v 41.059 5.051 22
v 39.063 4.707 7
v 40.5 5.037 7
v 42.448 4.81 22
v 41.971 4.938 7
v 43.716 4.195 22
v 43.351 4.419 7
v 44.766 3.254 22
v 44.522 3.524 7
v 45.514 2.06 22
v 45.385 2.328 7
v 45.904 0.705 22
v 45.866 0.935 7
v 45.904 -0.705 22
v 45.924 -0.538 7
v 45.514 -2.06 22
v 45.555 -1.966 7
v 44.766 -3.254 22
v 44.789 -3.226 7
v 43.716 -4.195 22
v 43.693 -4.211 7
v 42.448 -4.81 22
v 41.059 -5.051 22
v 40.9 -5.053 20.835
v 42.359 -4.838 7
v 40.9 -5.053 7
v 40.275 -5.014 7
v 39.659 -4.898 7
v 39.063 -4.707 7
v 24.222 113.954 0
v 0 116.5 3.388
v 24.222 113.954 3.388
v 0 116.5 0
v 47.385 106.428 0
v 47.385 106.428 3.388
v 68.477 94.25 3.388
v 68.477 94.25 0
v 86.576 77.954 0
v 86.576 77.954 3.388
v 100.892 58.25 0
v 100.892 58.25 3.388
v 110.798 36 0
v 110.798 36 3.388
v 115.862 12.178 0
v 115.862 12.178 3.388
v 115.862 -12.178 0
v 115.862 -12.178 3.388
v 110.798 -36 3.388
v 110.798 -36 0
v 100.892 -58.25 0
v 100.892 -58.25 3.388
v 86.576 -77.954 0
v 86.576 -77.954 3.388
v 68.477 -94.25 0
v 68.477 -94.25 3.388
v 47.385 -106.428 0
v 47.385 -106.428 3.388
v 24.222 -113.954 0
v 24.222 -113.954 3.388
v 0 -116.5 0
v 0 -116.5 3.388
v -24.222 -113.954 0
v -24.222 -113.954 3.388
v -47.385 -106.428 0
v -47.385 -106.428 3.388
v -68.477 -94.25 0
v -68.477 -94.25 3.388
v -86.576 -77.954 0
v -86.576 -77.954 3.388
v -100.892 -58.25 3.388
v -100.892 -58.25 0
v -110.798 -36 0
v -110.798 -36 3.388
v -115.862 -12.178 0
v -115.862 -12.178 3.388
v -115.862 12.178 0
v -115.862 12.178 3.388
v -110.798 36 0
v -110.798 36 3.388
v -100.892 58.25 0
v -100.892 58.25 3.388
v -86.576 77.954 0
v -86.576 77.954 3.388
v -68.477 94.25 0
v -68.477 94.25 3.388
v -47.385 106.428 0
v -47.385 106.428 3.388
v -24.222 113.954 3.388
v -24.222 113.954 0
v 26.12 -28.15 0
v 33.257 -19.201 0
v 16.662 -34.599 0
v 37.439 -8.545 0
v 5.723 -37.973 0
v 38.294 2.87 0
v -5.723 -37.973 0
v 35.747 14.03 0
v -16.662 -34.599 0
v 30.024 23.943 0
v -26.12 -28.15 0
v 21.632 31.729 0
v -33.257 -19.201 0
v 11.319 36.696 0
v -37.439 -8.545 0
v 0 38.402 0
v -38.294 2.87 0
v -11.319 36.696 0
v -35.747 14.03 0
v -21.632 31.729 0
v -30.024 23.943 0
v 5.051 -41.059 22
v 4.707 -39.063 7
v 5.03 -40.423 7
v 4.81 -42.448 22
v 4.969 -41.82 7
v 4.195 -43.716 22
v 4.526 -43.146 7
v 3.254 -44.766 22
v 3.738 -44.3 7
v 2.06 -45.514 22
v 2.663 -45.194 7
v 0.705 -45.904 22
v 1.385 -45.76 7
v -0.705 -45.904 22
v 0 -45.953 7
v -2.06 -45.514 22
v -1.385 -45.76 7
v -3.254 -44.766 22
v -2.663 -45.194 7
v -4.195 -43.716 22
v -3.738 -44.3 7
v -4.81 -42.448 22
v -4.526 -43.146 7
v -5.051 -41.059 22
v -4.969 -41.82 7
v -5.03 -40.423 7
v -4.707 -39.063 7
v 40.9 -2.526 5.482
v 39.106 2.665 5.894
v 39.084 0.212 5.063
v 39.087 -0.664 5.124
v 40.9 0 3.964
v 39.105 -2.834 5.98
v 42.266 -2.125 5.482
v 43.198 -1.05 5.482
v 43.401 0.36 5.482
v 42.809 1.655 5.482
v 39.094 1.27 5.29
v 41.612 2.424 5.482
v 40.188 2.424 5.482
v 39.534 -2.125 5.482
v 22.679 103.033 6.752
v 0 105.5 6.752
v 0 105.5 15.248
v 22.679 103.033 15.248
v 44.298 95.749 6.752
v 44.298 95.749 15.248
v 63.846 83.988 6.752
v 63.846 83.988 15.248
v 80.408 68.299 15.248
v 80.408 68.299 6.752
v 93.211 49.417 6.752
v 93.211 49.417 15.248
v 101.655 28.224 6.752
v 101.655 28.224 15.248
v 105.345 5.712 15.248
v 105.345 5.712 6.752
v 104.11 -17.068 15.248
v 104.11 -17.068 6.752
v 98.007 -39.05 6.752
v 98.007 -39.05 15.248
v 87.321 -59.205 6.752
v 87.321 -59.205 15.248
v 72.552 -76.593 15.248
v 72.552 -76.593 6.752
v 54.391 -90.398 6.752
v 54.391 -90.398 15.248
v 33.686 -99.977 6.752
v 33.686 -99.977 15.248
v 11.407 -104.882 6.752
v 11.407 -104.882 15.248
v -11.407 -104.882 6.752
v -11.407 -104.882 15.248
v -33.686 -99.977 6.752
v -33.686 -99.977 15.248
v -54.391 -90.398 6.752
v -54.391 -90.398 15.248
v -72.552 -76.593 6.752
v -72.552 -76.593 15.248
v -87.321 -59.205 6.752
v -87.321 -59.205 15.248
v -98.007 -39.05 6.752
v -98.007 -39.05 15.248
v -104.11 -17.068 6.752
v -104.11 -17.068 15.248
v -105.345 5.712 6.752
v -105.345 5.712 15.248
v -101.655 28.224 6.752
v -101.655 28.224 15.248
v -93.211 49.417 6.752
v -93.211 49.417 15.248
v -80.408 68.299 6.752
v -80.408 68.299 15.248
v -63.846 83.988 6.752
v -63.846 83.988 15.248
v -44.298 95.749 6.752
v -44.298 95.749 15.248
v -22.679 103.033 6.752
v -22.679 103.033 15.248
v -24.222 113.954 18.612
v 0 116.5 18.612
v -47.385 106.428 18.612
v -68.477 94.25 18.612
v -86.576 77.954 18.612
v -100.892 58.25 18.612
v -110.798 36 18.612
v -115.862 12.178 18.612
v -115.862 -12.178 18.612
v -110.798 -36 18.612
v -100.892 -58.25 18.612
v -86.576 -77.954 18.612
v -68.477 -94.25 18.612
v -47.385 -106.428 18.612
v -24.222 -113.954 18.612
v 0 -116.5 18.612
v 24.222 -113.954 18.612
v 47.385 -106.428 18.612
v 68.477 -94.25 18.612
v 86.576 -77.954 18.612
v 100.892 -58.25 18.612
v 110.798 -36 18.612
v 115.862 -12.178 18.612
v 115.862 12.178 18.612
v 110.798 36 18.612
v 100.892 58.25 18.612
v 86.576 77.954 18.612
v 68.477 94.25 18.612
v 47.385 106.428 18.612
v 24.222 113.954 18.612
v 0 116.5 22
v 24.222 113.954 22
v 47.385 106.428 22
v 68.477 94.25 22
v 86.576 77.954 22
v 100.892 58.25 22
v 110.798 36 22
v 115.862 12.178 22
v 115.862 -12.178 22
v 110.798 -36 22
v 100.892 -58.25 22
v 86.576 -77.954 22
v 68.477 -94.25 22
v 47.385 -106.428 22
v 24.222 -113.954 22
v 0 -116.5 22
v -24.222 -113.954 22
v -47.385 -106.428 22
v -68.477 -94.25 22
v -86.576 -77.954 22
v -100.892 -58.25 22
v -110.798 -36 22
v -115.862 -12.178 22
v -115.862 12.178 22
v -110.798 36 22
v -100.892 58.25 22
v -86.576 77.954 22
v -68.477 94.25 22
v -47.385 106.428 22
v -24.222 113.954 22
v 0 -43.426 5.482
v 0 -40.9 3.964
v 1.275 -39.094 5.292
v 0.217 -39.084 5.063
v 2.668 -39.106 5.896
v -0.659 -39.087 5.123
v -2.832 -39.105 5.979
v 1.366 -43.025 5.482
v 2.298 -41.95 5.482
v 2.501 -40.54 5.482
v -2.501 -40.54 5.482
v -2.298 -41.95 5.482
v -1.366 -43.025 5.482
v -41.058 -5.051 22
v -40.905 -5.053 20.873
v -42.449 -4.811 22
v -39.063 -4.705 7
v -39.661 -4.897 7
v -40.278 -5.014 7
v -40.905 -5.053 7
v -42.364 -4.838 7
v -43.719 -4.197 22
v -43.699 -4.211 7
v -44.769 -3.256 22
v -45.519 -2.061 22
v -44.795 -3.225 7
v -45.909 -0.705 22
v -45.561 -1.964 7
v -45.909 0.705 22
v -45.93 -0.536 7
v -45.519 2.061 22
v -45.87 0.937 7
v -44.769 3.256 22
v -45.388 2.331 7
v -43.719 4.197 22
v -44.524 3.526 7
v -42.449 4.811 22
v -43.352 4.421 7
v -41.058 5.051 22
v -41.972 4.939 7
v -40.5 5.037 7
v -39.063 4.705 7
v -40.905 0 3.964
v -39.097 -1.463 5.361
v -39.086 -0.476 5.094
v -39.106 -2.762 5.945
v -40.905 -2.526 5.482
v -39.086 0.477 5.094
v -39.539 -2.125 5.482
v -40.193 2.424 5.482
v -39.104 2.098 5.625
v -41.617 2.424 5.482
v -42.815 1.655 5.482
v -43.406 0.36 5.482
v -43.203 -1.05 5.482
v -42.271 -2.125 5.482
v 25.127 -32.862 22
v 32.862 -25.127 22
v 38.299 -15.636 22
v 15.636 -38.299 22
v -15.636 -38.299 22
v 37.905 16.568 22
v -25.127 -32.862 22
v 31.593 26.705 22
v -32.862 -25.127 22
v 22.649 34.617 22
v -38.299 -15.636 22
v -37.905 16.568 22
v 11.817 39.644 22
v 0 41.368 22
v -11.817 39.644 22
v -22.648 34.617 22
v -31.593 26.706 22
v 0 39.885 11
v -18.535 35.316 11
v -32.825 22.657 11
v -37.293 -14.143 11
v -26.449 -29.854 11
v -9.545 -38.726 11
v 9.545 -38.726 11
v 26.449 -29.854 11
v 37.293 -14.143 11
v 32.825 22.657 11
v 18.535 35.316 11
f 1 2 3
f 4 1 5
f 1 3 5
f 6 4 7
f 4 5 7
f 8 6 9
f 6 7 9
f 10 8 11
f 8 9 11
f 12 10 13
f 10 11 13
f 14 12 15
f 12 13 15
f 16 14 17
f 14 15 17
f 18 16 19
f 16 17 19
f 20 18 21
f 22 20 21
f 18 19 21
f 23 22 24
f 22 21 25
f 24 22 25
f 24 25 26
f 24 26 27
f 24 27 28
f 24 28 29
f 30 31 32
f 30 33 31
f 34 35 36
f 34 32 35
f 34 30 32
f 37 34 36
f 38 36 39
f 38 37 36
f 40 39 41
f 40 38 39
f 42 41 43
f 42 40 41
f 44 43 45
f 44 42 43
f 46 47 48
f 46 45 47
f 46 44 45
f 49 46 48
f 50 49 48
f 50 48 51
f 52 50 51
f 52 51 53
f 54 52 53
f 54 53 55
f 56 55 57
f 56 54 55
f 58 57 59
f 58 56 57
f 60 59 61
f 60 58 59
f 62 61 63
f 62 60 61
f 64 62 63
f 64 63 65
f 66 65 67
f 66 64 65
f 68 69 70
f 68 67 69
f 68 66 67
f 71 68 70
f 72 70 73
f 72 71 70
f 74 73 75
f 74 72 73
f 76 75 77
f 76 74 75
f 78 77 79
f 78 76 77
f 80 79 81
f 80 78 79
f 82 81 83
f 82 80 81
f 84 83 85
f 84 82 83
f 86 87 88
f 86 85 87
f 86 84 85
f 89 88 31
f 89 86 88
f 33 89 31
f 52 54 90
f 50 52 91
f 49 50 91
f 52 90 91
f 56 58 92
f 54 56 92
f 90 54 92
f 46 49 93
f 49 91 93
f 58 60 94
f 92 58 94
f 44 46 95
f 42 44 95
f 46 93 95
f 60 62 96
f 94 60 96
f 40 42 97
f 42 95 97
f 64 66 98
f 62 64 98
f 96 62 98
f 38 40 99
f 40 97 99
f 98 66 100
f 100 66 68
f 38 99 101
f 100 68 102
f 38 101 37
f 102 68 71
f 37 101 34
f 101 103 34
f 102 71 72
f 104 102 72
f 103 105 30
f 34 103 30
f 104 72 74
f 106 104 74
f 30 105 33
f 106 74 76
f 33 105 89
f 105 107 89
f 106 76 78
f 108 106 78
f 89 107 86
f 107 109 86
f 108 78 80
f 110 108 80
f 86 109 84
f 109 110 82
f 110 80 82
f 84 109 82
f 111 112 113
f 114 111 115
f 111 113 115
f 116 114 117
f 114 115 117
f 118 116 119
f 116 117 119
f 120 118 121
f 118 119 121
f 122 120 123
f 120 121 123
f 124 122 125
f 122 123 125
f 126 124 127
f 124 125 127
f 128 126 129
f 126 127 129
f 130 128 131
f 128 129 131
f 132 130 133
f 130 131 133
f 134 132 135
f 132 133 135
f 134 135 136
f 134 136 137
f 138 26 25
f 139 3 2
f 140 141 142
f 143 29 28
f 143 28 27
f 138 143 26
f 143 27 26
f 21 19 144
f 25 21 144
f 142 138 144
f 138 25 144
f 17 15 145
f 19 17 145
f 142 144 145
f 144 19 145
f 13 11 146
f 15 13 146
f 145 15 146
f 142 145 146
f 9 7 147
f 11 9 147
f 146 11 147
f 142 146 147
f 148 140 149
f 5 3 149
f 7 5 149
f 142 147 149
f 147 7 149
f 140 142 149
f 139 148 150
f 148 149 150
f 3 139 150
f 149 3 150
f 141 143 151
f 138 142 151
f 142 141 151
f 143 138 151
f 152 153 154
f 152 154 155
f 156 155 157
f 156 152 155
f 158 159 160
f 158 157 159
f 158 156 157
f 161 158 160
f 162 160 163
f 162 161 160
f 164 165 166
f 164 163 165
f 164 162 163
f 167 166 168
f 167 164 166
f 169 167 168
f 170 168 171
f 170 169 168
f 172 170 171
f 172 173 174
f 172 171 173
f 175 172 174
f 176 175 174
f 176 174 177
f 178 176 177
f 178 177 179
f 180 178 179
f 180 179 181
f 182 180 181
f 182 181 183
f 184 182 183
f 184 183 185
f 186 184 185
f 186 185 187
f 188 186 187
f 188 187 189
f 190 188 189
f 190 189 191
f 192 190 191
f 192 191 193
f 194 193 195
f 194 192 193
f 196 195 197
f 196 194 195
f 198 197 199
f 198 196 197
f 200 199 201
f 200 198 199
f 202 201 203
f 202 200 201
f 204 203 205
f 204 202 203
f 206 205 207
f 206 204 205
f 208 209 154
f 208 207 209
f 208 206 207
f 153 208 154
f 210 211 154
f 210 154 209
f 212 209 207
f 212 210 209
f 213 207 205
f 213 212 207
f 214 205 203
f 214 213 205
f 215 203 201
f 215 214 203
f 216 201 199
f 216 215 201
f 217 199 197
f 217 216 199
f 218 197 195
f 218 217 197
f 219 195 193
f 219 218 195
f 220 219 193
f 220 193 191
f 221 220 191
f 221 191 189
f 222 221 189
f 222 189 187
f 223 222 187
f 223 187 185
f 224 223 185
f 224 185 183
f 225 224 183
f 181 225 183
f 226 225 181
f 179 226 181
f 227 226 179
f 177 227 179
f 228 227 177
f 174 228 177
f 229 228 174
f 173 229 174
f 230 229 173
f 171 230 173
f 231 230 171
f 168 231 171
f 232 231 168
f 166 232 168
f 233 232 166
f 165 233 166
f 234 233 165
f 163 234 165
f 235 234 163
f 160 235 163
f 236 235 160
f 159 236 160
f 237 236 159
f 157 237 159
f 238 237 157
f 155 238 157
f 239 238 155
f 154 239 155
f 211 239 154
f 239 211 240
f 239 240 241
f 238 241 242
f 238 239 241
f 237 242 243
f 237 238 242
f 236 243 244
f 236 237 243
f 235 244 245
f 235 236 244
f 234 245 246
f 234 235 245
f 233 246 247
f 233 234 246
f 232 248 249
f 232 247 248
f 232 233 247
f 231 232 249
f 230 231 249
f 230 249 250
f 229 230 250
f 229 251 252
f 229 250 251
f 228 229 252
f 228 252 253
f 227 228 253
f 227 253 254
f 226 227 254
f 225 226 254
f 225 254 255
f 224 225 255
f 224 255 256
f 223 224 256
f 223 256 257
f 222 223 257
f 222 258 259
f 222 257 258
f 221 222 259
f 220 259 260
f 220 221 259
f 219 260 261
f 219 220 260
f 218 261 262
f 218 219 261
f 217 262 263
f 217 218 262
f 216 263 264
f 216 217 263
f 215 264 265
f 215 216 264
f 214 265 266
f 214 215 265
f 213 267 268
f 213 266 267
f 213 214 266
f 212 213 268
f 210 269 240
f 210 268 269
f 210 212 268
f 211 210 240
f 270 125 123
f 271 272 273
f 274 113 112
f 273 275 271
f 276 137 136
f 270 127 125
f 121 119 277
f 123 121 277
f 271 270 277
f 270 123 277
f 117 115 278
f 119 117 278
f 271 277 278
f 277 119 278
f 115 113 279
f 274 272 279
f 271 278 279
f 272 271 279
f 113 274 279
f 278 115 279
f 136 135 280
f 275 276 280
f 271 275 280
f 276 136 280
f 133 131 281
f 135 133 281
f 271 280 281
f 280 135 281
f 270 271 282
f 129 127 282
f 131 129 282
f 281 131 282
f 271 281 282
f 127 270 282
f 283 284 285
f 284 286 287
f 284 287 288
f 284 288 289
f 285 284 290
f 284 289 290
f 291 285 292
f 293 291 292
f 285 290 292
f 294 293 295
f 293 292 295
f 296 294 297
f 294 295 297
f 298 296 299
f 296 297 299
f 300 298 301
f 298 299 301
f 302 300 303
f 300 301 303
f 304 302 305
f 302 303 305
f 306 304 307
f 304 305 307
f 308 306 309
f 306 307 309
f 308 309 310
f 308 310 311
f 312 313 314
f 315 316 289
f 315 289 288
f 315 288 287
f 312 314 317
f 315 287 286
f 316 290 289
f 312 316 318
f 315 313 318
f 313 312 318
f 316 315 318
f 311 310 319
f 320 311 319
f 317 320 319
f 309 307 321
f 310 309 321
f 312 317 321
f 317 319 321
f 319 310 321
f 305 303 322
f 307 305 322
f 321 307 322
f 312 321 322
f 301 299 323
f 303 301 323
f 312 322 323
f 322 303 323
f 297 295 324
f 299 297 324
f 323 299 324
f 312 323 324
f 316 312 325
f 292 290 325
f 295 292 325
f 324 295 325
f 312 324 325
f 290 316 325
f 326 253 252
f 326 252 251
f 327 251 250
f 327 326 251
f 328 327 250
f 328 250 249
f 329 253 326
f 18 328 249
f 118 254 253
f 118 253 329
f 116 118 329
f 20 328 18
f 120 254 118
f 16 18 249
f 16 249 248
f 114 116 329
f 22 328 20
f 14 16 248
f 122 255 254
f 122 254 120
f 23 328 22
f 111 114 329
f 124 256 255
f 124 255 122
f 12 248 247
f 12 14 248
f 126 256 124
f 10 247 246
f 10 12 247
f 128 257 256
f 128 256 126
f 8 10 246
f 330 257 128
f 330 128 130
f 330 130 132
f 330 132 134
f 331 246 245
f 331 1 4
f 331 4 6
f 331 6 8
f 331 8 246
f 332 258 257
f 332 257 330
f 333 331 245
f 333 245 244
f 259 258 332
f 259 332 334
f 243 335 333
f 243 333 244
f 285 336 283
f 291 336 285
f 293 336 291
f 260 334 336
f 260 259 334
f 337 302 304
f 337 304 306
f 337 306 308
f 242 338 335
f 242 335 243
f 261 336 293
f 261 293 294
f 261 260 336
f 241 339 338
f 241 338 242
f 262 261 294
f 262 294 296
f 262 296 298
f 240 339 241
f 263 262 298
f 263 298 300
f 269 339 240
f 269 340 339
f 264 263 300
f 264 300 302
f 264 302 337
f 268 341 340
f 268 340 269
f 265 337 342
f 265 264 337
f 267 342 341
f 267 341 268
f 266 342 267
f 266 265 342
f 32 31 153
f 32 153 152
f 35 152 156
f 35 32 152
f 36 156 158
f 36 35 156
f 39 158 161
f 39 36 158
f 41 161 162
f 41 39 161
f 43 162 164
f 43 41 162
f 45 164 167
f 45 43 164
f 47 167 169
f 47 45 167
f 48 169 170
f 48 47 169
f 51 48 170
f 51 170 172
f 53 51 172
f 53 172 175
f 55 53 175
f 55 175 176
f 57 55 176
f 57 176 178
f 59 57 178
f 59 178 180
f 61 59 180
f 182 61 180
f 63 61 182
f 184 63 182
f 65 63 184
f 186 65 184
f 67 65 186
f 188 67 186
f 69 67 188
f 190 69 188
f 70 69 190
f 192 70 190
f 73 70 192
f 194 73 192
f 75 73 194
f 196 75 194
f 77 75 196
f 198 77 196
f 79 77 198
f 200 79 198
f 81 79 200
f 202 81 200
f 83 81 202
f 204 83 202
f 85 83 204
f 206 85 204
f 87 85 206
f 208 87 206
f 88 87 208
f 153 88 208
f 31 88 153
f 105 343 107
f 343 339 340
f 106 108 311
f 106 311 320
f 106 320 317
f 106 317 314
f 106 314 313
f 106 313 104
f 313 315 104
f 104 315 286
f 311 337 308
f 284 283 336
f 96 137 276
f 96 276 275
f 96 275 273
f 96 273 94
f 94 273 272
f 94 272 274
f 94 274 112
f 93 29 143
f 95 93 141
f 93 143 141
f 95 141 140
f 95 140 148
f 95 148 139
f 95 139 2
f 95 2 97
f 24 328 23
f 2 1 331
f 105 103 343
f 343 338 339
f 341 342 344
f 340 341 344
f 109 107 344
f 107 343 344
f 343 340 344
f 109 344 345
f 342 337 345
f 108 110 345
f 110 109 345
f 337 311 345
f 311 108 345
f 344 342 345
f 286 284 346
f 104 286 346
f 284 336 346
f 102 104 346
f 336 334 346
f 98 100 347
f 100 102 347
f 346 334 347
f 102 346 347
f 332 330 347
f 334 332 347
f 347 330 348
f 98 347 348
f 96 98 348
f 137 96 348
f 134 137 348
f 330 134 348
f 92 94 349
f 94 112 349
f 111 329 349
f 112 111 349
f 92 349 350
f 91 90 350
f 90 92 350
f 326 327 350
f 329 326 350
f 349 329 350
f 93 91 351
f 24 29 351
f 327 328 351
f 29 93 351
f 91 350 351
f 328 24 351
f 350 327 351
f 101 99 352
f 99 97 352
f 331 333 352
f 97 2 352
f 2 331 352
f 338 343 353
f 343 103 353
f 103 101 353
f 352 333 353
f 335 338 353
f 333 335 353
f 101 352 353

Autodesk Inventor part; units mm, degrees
ref_plane "XZ Plane" through (0, 0, 0) normal (0, 1, 0) x (-1, 0, 0)
ref_plane "XY Plane" through (0, 0, 0) normal (0, 0, 1) x (1, 0, 0)
sketch "Esquisse principale" plane through (0, 0, 0) normal (1, 0, 0) x (0, 1, 0)
  line L0 (0, 22) -> (116.5, 22)
  line L1 (116.5, 22) -> (116.5, 18.6115)
  line L2 (116.5, 18.6115) -> (105.5, 15.2484)
  line L3 (105.5, 15.2484) -> (105.5, 6.7516)
  line L4 (105.5, 6.7516) -> (116.5, 3.3885)
  line L5 (116.5, 3.3885) -> (116.5, 0)
  line L6 (116.5, 0) -> (0, 0)
  line L7 (114.5, 18) -> (114.5, 4) construction
  line L8 (105.5, 11) -> (114.5, 11) construction
  line L9 (116.5, 18.6115) -> (116.5, 3.3885)
  line L10 (0, -4.4) -> (0, 26.4) projected
  line L11 (0, 0) -> (0, 22)
  dimension "d0" = 14
  dimension "d1" = 34
  dimension "d2" = 2
  dimension "d6" = 22
  dimension "d21" = 229
  dimension "d25" = 11
  dimension "d27" = 11
ref_plane "Plan de courroie" through (0, 105.5, 11) normal (0, 0, 1) x (1, 0, 0)
revolve "Corps" add sketch "Esquisse principale" angle 360 about axis through (0, 0, -10) along (0, 0, 1)
revolve "Bord" cut sketch "Esquisse principale" angle 360 about axis through (0, 0, -10) along (0, 0, 1) contours L9 L4 L3 L2
fillet "Congé externe" [suppressed]
fillet "Congé interne" [suppressed]
sketch "Esquisse4" plane through (0, 0, 0) normal (1, 0, 0) x (0, 1, 0)
  line L0 (0, -20.2967) -> (0, 37.5815)
  line L1 (12.5, 32.25) -> (12.5, -12.25)
  line L2 (12.5, -12.25) -> (36.75, -12.25)
  line L3 (12.5, 32.25) -> (42.75, 32.25)
  line L4 (42.75, 32.25) -> (36.75, -12.25)
  line L5 (-116.5, 0) -> (116.5, 0) projected
  line L6 (12.5, 32.25) -> (0, 32.25)
  line L7 (12.5, -12.25) -> (0, -12.25)
  line L8 (0, -12.25) -> (0, 32.25)
  point P0 (0, 0)
  point P1 (0, 0)
  point P2 (12.5, 0)
  dimension "d48" = 12.5
  dimension "d49" = 73.5
  dimension "d50" = 85.5
  dimension "d51" = 44.5
  dimension "d52" = 12.25
revolve "Révolution3" cut sketch "Esquisse4" angle 360 about axis through (0, 0, -20.2967) along (0, 0, 1) contours L0 L6 L1 L5 | L1 L5 L4 L2 | L1 L3 L4 L5
sketch "Esquisse5" plane through (0, 0, 22) normal (0, 0, 1) x (1, 0, 0)
  line L0 (0, 0) -> (97.3173, 0)
  line L1 (0, 0) -> (-92.8604, 0)
  line L2 (0, 0) -> (0, -102.459)
  circle A0 centre (0, 0) radius 40.9
  point P0 (0, 0)
  point P1 (0, -40.9)
  point P2 (-40.9051, 0)
  point P3 (40.9, 0)
  dimension "d68" = 81.8
hole "Perçage3" at (0, -40.9, 22) at (-40.9051, 0, 22) at (40.9, 0, 22) direction (0, 0, -1) diameter 10.106 depth 15 tip angle 118 thread size "M12x1.75" class "6H" standard "ANSI Metric M Profile"
equation "\"d0\" = da_Bw"
equation "\"d1\" = da_Alfa"
equation "\"d2\" = da_c"
equation "\"d21\" = da_Dw"
equation "\"d25\" = da_Hd"
equation "\"d27\" = da_Se"
equation "\"da_r1\" = 0"
equation "\"da_r2\" = 0"
equation "\"d5\" = da_Se"
equation "\"da_Bw\" = 14"
equation "\"da_Alfa\" = 34deg"
equation "\"da_c\" = 2"
equation "\"da_Dw\" = 229"
equation "\"da_Hd\" = 11"
equation "\"da_Se\" = 11"
equation "\"da_Sg\" = 12"
properties part number "Poulie à gorge1" material "Steel"
